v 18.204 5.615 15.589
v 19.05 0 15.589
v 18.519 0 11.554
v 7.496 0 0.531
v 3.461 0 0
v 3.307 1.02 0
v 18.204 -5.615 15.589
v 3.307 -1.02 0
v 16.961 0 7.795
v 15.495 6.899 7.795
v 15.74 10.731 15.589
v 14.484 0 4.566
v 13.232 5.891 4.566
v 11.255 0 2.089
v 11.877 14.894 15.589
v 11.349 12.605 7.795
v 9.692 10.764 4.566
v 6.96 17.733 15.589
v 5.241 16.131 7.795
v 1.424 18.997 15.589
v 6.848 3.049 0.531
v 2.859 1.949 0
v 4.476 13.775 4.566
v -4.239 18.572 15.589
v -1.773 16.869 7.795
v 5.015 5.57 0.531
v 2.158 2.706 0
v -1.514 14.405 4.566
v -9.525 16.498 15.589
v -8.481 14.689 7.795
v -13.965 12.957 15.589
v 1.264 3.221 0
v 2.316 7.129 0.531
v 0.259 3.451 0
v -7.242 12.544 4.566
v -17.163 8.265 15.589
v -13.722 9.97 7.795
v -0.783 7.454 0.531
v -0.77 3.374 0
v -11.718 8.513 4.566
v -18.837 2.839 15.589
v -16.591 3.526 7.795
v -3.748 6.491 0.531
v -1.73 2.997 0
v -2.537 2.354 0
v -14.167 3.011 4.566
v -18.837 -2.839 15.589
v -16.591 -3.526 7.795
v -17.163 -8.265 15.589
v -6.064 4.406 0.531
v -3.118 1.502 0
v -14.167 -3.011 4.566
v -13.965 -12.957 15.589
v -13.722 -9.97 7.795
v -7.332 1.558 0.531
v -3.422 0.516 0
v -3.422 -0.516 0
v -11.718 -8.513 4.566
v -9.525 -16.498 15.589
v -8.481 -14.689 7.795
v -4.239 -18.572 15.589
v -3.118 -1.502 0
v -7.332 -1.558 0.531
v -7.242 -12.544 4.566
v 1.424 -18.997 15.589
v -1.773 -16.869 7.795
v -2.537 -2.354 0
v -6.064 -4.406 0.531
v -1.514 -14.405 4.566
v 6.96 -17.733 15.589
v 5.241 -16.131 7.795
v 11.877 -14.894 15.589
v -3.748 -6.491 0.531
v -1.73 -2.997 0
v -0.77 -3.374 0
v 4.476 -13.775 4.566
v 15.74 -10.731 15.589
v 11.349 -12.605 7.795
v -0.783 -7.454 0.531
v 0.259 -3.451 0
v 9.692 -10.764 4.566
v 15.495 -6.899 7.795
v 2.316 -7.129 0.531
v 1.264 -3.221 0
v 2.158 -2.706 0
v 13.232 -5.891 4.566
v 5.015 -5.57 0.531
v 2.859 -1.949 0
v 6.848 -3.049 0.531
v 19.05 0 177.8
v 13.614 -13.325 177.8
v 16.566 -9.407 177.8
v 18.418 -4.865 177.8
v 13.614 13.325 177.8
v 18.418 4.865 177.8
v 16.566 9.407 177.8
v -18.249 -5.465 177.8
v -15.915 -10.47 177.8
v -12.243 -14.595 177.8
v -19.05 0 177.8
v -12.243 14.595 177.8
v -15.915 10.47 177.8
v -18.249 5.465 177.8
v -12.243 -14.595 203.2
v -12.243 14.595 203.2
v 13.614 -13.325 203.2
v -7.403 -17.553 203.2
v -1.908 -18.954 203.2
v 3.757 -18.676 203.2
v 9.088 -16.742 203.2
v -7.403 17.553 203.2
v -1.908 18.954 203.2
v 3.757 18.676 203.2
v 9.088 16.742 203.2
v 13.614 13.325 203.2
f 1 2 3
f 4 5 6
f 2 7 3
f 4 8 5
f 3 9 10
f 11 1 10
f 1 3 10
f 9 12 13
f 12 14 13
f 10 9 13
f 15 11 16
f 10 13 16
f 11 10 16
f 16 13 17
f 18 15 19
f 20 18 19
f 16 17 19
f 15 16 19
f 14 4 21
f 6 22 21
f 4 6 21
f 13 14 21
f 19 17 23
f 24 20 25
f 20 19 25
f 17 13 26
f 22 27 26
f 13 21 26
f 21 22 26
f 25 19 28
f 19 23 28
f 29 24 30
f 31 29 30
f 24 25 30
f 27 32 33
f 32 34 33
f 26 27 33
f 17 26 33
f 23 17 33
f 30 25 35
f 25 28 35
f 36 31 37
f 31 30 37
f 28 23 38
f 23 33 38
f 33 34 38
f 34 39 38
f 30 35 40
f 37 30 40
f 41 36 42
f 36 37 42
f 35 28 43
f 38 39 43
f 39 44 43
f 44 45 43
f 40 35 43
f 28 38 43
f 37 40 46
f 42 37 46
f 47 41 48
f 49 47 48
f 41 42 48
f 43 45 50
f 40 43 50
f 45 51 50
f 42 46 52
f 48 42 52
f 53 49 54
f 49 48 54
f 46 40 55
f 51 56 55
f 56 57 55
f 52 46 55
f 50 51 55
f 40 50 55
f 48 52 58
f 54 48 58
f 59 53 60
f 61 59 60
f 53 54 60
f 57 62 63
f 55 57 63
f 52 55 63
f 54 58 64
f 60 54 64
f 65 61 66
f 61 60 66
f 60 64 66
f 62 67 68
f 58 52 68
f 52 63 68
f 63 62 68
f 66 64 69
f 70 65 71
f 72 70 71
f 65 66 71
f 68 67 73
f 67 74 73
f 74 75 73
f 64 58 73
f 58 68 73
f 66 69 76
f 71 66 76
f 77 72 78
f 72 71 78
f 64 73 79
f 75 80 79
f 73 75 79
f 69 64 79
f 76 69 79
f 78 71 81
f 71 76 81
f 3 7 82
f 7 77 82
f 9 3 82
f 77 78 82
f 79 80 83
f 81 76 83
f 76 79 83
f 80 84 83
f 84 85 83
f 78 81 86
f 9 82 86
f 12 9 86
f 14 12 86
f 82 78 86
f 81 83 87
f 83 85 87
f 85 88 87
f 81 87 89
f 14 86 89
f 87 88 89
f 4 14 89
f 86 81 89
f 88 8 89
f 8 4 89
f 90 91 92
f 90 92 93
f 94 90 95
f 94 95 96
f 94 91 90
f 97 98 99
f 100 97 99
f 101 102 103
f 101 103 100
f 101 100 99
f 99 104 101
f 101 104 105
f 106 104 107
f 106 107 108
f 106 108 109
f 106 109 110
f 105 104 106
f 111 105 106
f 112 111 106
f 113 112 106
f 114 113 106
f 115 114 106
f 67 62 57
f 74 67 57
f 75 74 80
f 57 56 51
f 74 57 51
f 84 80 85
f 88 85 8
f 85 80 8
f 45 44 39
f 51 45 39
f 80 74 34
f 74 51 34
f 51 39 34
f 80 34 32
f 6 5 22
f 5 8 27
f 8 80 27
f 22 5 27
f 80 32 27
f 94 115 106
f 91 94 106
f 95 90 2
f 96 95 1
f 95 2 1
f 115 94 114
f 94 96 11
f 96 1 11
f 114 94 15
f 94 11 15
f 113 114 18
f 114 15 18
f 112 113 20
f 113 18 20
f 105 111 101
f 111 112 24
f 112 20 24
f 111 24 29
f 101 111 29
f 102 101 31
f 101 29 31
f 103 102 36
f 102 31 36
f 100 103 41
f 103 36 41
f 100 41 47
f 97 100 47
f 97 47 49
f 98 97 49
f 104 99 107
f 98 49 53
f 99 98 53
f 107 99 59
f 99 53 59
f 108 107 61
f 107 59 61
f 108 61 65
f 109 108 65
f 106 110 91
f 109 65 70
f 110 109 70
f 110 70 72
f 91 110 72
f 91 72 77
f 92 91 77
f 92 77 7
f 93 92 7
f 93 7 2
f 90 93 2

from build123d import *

# Parameters (mm, degrees)
F0_R     = 19.05
F1_DEPTH = 203.2
F3_DEPTH = 25.4
F4_DEPTH = 25.4
F5_R     = 15.5892770942


with BuildPart() as f1:
    # F0 (on Top) → F1 (new body)
    with BuildSketch(Plane.XY):
        Circle(F0_R)
    extrude(amount=F1_DEPTH)

    # F2 (on face) → F3 (cut)
    with BuildSketch(Plane.XY.offset(203.2)):
        with BuildLine():
            Line((-12.2428, -14.5950795873), (-12.2428, 14.5950795873))
            ThreePointArc((-12.2428, 14.5950795873), (-19.05, 0), (-12.2428, -14.5950795873))
        make_face()
    extrude(amount=-F3_DEPTH, mode=Mode.SUBTRACT)

    # F2 (on face) → F4 (cut)
    with BuildSketch(Plane.XY.offset(203.2)):
        with BuildLine():
            ThreePointArc((13.6144, -13.3248119176), (17.6388324444, -7.1954214609), (19.05, 0))
            ThreePointArc((19.05, 0), (17.6388324444, 7.1954214609), (13.6144, 13.3248119176))
            Line((13.6144, 13.3248119176), (13.6144, -13.3248119176))
        make_face()
    extrude(amount=-F4_DEPTH, mode=Mode.SUBTRACT)

    # F5
    f5_edges = [f1.edges().sort_by_distance(p)[0] for p in [
        (-19.05, 0, 0),
    ]]
    fillet(f5_edges, radius=F5_R)


solid = f1.part
